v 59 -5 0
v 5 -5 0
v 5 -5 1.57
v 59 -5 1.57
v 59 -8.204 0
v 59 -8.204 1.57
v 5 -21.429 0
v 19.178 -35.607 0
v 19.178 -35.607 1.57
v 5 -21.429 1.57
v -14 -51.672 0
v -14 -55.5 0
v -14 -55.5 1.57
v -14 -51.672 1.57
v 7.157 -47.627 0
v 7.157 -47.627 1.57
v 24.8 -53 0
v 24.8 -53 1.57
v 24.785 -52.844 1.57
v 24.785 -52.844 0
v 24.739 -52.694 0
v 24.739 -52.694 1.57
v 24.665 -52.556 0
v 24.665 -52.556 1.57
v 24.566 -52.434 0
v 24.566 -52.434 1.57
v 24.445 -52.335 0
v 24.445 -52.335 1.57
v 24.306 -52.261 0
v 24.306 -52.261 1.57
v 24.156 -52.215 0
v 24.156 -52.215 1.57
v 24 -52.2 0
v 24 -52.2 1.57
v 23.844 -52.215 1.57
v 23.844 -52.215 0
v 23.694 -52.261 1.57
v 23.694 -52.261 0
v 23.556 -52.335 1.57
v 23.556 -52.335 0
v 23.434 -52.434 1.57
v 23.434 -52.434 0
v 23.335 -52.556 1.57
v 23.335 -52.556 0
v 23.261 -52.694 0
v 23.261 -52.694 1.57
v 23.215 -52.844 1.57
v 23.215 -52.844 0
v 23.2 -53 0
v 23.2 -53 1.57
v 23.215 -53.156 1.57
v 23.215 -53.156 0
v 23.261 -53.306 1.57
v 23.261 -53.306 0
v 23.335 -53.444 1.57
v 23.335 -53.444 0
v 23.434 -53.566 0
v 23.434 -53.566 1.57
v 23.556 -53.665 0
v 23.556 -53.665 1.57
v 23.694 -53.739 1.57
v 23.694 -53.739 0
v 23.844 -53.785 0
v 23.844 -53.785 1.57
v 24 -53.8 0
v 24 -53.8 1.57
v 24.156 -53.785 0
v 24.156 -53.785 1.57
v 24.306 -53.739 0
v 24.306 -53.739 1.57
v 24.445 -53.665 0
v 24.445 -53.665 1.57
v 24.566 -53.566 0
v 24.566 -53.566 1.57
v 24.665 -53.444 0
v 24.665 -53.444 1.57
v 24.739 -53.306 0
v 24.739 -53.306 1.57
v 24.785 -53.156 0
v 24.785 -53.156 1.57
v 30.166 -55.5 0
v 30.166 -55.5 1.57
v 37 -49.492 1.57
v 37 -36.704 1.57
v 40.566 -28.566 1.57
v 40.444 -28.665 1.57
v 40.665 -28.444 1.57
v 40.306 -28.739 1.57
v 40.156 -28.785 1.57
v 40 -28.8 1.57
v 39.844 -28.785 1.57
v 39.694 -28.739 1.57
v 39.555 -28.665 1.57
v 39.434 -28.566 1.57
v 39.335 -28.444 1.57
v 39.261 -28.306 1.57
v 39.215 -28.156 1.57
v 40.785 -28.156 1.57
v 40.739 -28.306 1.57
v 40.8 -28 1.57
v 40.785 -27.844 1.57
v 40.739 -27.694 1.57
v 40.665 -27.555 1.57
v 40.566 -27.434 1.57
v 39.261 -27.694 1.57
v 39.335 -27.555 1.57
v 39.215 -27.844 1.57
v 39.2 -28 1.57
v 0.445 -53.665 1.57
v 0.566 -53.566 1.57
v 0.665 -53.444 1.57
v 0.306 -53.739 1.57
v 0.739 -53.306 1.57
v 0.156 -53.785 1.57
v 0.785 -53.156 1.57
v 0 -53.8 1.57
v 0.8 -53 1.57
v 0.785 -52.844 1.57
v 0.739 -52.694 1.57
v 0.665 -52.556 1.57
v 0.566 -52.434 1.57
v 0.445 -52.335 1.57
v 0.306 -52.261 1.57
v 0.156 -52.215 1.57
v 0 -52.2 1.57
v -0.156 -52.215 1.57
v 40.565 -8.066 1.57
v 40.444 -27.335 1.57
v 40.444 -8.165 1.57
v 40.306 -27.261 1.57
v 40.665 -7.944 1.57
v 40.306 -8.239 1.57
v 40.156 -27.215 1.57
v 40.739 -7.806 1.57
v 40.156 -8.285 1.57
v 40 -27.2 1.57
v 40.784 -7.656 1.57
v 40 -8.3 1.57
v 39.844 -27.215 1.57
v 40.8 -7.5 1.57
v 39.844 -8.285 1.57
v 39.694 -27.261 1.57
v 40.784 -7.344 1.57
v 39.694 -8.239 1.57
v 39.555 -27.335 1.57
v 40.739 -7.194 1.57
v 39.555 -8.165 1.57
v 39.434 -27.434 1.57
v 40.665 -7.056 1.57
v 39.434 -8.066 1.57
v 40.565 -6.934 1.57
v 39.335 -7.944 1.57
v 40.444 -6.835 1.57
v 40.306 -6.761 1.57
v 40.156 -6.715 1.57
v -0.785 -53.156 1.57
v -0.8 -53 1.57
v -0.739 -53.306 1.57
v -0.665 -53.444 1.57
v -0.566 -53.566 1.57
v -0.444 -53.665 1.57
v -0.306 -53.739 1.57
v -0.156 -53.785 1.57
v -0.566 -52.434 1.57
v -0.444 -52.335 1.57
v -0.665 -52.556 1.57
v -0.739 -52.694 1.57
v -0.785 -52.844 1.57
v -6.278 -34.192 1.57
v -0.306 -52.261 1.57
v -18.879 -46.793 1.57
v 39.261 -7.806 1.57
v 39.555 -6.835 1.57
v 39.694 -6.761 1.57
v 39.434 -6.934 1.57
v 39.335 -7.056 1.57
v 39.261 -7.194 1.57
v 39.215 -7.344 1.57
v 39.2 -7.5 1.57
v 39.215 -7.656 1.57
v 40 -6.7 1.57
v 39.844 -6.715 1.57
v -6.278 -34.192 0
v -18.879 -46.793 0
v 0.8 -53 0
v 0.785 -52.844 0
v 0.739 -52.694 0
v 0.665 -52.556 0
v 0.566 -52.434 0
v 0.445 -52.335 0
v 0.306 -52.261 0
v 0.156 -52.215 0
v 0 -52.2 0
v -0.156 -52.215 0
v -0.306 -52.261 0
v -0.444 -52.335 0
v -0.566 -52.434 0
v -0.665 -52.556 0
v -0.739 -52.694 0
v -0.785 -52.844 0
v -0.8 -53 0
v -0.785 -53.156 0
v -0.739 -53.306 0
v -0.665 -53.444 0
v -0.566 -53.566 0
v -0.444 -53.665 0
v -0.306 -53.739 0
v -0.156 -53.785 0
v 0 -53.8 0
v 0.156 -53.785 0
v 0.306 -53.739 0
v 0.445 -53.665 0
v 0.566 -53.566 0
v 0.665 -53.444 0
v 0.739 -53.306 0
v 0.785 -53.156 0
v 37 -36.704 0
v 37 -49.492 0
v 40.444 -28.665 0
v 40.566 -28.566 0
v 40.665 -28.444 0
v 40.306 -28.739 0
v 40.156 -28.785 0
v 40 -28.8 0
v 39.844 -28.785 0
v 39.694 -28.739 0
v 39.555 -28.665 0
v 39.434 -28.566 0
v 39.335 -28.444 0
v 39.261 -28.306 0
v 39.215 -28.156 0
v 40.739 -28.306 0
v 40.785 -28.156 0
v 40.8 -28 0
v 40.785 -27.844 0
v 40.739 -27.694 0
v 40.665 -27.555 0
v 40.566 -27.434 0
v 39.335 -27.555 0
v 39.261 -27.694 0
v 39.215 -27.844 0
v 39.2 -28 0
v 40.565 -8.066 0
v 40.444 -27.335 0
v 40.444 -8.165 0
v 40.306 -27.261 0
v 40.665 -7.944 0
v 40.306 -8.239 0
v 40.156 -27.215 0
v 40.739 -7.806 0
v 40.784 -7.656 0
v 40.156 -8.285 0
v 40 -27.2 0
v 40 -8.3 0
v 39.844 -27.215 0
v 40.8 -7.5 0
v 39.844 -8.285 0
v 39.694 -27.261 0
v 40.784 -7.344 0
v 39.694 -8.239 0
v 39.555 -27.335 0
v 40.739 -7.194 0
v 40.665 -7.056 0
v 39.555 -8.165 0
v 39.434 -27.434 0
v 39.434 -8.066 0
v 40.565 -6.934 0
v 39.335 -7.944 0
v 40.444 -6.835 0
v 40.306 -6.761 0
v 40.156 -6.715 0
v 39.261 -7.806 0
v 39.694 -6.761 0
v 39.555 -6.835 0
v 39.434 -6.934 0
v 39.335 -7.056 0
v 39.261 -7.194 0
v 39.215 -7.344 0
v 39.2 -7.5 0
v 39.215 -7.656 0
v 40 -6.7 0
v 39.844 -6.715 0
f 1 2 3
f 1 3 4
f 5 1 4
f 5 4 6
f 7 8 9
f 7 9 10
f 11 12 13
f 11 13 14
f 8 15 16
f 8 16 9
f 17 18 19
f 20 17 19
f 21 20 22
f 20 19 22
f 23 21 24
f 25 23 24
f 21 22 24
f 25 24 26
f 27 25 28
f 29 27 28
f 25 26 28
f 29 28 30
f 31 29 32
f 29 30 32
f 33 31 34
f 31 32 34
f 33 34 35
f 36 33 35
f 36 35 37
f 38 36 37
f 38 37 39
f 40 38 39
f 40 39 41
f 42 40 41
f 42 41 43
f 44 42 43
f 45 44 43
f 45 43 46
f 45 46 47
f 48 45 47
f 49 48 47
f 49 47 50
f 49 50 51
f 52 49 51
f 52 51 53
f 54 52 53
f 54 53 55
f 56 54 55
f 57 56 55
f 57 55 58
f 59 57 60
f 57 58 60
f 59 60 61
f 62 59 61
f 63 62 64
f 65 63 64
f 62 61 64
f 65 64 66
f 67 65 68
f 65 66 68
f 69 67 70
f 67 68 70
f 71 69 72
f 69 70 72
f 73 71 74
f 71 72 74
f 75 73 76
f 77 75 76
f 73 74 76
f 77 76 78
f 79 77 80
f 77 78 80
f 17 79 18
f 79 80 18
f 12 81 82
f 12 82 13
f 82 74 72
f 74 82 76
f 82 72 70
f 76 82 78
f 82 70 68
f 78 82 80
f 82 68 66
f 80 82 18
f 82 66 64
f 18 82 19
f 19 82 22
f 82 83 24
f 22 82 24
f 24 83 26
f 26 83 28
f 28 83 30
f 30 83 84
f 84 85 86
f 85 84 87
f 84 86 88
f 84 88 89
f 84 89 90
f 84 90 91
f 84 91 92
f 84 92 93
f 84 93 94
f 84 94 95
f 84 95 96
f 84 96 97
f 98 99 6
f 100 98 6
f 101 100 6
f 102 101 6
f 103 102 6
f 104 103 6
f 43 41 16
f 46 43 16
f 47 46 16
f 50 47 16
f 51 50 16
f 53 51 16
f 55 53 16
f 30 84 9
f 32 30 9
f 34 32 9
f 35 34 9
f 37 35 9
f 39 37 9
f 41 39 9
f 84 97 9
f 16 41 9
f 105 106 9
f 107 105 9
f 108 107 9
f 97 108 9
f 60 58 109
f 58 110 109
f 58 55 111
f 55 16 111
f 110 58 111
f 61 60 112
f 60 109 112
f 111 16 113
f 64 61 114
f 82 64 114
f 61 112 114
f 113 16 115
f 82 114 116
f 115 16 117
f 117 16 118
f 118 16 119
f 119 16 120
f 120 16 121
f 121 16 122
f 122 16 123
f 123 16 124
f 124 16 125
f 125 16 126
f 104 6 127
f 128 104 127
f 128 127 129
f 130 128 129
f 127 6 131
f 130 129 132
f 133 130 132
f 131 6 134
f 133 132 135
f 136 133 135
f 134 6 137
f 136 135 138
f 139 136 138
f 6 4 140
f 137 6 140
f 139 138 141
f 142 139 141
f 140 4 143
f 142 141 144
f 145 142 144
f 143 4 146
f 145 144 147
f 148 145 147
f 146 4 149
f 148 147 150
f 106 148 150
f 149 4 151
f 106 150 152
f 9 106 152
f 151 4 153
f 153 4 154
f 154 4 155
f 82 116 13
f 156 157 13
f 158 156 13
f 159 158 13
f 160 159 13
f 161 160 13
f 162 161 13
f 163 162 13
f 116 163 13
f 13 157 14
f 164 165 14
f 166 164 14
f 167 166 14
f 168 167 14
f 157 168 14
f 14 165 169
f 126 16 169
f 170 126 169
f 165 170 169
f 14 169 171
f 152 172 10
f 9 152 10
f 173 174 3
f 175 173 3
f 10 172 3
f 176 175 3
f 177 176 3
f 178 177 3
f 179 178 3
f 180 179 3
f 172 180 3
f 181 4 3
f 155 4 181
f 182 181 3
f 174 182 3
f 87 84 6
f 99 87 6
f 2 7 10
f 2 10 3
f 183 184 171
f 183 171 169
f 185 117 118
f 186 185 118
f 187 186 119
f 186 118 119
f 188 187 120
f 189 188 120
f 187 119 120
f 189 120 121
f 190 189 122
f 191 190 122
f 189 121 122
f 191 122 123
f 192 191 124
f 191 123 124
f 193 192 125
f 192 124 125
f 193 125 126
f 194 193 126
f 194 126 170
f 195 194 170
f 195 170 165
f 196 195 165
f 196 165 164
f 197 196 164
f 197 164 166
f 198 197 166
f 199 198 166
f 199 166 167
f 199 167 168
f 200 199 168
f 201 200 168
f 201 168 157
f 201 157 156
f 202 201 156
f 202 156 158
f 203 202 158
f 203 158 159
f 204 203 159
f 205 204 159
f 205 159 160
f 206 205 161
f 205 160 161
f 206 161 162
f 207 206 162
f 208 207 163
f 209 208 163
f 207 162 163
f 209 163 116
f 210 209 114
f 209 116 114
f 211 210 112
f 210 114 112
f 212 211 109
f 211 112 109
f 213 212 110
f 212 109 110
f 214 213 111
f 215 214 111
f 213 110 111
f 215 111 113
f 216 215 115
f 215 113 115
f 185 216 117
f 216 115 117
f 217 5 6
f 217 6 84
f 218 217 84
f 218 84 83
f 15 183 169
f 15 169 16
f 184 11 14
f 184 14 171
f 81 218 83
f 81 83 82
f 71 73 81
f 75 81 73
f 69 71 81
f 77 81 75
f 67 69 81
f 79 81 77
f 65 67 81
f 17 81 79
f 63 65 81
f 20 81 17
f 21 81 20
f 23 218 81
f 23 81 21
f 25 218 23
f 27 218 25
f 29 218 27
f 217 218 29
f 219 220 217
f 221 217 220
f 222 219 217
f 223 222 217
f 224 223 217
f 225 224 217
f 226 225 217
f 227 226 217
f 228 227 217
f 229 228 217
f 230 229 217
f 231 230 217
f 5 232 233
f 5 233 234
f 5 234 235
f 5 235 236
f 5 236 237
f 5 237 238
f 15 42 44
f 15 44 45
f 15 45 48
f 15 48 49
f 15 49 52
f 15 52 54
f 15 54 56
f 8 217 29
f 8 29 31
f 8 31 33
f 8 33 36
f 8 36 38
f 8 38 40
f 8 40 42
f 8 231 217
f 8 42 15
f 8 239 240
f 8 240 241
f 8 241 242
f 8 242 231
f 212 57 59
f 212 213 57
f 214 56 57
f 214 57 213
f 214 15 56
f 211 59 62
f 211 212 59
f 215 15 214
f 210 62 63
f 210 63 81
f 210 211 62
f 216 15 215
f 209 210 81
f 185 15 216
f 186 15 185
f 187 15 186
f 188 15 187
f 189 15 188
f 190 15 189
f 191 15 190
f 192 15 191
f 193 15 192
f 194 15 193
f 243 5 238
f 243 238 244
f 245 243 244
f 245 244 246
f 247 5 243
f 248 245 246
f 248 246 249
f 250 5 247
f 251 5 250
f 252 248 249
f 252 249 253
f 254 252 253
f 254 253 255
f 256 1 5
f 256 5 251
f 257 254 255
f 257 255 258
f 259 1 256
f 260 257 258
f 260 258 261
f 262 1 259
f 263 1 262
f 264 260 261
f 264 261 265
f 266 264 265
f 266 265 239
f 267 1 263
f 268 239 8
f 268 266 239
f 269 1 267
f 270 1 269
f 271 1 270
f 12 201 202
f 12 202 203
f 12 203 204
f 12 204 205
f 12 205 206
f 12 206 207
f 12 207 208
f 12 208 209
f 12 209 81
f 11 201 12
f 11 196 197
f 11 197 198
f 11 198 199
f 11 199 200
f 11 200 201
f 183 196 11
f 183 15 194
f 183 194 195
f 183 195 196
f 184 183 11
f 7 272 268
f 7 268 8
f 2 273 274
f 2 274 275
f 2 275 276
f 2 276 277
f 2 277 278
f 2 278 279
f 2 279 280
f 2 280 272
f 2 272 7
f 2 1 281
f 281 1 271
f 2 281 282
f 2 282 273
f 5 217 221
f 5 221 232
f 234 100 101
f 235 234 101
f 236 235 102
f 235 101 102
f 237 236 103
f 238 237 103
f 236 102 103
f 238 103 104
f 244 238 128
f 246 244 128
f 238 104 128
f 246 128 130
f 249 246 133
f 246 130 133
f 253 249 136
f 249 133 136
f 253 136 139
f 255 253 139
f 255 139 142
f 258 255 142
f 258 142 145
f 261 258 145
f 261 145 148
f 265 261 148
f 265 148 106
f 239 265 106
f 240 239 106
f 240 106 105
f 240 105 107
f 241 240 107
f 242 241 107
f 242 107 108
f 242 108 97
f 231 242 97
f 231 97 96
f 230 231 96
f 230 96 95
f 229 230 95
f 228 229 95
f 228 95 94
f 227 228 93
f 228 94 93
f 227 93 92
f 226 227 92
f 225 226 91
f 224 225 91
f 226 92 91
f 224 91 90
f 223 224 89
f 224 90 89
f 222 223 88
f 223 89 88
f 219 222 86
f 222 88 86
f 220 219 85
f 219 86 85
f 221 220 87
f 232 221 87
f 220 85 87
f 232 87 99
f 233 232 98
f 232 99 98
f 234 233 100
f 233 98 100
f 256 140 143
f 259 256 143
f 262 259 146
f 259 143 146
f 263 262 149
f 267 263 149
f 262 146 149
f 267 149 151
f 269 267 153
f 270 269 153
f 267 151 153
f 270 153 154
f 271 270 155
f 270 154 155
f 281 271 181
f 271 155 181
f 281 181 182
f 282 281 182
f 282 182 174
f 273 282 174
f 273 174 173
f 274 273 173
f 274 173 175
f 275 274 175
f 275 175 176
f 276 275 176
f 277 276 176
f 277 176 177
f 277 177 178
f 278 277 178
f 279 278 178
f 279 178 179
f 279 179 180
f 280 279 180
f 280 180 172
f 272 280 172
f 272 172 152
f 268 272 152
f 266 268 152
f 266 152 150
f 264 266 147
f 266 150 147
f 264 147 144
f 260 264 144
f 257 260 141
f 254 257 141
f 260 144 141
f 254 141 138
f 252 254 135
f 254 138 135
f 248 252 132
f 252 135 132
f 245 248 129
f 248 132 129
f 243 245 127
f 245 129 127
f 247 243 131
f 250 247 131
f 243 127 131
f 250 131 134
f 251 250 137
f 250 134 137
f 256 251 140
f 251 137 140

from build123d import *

# Parameters (mm, degrees)
BOSS_EXTRUDE1_DEPTH = 1.57
SKETCH4_R           = 0.8
CUT_EXTRUDE1_DEPTH  = 2.57


with BuildPart() as part:
    # Sketch2 → Boss-Extrude1 (new body)
    with BuildSketch(Plane.XY):
        Polygon((-14, -55.500103029), (-14, -51.671572877), (-18.878667627, -46.792905249), (-6.278214078, -34.1924517), (7.156814765, -47.627480542), (19.177630045, -35.606665262), (5, -21.429035217), (5, -5), (59, -5), (59, -8.204229809), (37.000000001, -36.704229808), (37.000000001, -49.491817554), (30.165562087, -55.500103029), align=None)
    extrude(amount=BOSS_EXTRUDE1_DEPTH)

    # Sketch4 → Cut-Extrude1 (cut, through all)
    with BuildSketch(Plane.XY.offset(1.57)):
        with Locations((39.999798764, -7.5)):
            Circle(SKETCH4_R)
        with Locations((39.999898107, -27.999885516)):
            Circle(SKETCH4_R)
        with Locations((24.000063681, -52.999991481)):
            Circle(SKETCH4_R)
        with Locations((6.3681e-05, -52.999991481)):
            Circle(SKETCH4_R)
    extrude(amount=-CUT_EXTRUDE1_DEPTH, mode=Mode.SUBTRACT)


solid = part.part
